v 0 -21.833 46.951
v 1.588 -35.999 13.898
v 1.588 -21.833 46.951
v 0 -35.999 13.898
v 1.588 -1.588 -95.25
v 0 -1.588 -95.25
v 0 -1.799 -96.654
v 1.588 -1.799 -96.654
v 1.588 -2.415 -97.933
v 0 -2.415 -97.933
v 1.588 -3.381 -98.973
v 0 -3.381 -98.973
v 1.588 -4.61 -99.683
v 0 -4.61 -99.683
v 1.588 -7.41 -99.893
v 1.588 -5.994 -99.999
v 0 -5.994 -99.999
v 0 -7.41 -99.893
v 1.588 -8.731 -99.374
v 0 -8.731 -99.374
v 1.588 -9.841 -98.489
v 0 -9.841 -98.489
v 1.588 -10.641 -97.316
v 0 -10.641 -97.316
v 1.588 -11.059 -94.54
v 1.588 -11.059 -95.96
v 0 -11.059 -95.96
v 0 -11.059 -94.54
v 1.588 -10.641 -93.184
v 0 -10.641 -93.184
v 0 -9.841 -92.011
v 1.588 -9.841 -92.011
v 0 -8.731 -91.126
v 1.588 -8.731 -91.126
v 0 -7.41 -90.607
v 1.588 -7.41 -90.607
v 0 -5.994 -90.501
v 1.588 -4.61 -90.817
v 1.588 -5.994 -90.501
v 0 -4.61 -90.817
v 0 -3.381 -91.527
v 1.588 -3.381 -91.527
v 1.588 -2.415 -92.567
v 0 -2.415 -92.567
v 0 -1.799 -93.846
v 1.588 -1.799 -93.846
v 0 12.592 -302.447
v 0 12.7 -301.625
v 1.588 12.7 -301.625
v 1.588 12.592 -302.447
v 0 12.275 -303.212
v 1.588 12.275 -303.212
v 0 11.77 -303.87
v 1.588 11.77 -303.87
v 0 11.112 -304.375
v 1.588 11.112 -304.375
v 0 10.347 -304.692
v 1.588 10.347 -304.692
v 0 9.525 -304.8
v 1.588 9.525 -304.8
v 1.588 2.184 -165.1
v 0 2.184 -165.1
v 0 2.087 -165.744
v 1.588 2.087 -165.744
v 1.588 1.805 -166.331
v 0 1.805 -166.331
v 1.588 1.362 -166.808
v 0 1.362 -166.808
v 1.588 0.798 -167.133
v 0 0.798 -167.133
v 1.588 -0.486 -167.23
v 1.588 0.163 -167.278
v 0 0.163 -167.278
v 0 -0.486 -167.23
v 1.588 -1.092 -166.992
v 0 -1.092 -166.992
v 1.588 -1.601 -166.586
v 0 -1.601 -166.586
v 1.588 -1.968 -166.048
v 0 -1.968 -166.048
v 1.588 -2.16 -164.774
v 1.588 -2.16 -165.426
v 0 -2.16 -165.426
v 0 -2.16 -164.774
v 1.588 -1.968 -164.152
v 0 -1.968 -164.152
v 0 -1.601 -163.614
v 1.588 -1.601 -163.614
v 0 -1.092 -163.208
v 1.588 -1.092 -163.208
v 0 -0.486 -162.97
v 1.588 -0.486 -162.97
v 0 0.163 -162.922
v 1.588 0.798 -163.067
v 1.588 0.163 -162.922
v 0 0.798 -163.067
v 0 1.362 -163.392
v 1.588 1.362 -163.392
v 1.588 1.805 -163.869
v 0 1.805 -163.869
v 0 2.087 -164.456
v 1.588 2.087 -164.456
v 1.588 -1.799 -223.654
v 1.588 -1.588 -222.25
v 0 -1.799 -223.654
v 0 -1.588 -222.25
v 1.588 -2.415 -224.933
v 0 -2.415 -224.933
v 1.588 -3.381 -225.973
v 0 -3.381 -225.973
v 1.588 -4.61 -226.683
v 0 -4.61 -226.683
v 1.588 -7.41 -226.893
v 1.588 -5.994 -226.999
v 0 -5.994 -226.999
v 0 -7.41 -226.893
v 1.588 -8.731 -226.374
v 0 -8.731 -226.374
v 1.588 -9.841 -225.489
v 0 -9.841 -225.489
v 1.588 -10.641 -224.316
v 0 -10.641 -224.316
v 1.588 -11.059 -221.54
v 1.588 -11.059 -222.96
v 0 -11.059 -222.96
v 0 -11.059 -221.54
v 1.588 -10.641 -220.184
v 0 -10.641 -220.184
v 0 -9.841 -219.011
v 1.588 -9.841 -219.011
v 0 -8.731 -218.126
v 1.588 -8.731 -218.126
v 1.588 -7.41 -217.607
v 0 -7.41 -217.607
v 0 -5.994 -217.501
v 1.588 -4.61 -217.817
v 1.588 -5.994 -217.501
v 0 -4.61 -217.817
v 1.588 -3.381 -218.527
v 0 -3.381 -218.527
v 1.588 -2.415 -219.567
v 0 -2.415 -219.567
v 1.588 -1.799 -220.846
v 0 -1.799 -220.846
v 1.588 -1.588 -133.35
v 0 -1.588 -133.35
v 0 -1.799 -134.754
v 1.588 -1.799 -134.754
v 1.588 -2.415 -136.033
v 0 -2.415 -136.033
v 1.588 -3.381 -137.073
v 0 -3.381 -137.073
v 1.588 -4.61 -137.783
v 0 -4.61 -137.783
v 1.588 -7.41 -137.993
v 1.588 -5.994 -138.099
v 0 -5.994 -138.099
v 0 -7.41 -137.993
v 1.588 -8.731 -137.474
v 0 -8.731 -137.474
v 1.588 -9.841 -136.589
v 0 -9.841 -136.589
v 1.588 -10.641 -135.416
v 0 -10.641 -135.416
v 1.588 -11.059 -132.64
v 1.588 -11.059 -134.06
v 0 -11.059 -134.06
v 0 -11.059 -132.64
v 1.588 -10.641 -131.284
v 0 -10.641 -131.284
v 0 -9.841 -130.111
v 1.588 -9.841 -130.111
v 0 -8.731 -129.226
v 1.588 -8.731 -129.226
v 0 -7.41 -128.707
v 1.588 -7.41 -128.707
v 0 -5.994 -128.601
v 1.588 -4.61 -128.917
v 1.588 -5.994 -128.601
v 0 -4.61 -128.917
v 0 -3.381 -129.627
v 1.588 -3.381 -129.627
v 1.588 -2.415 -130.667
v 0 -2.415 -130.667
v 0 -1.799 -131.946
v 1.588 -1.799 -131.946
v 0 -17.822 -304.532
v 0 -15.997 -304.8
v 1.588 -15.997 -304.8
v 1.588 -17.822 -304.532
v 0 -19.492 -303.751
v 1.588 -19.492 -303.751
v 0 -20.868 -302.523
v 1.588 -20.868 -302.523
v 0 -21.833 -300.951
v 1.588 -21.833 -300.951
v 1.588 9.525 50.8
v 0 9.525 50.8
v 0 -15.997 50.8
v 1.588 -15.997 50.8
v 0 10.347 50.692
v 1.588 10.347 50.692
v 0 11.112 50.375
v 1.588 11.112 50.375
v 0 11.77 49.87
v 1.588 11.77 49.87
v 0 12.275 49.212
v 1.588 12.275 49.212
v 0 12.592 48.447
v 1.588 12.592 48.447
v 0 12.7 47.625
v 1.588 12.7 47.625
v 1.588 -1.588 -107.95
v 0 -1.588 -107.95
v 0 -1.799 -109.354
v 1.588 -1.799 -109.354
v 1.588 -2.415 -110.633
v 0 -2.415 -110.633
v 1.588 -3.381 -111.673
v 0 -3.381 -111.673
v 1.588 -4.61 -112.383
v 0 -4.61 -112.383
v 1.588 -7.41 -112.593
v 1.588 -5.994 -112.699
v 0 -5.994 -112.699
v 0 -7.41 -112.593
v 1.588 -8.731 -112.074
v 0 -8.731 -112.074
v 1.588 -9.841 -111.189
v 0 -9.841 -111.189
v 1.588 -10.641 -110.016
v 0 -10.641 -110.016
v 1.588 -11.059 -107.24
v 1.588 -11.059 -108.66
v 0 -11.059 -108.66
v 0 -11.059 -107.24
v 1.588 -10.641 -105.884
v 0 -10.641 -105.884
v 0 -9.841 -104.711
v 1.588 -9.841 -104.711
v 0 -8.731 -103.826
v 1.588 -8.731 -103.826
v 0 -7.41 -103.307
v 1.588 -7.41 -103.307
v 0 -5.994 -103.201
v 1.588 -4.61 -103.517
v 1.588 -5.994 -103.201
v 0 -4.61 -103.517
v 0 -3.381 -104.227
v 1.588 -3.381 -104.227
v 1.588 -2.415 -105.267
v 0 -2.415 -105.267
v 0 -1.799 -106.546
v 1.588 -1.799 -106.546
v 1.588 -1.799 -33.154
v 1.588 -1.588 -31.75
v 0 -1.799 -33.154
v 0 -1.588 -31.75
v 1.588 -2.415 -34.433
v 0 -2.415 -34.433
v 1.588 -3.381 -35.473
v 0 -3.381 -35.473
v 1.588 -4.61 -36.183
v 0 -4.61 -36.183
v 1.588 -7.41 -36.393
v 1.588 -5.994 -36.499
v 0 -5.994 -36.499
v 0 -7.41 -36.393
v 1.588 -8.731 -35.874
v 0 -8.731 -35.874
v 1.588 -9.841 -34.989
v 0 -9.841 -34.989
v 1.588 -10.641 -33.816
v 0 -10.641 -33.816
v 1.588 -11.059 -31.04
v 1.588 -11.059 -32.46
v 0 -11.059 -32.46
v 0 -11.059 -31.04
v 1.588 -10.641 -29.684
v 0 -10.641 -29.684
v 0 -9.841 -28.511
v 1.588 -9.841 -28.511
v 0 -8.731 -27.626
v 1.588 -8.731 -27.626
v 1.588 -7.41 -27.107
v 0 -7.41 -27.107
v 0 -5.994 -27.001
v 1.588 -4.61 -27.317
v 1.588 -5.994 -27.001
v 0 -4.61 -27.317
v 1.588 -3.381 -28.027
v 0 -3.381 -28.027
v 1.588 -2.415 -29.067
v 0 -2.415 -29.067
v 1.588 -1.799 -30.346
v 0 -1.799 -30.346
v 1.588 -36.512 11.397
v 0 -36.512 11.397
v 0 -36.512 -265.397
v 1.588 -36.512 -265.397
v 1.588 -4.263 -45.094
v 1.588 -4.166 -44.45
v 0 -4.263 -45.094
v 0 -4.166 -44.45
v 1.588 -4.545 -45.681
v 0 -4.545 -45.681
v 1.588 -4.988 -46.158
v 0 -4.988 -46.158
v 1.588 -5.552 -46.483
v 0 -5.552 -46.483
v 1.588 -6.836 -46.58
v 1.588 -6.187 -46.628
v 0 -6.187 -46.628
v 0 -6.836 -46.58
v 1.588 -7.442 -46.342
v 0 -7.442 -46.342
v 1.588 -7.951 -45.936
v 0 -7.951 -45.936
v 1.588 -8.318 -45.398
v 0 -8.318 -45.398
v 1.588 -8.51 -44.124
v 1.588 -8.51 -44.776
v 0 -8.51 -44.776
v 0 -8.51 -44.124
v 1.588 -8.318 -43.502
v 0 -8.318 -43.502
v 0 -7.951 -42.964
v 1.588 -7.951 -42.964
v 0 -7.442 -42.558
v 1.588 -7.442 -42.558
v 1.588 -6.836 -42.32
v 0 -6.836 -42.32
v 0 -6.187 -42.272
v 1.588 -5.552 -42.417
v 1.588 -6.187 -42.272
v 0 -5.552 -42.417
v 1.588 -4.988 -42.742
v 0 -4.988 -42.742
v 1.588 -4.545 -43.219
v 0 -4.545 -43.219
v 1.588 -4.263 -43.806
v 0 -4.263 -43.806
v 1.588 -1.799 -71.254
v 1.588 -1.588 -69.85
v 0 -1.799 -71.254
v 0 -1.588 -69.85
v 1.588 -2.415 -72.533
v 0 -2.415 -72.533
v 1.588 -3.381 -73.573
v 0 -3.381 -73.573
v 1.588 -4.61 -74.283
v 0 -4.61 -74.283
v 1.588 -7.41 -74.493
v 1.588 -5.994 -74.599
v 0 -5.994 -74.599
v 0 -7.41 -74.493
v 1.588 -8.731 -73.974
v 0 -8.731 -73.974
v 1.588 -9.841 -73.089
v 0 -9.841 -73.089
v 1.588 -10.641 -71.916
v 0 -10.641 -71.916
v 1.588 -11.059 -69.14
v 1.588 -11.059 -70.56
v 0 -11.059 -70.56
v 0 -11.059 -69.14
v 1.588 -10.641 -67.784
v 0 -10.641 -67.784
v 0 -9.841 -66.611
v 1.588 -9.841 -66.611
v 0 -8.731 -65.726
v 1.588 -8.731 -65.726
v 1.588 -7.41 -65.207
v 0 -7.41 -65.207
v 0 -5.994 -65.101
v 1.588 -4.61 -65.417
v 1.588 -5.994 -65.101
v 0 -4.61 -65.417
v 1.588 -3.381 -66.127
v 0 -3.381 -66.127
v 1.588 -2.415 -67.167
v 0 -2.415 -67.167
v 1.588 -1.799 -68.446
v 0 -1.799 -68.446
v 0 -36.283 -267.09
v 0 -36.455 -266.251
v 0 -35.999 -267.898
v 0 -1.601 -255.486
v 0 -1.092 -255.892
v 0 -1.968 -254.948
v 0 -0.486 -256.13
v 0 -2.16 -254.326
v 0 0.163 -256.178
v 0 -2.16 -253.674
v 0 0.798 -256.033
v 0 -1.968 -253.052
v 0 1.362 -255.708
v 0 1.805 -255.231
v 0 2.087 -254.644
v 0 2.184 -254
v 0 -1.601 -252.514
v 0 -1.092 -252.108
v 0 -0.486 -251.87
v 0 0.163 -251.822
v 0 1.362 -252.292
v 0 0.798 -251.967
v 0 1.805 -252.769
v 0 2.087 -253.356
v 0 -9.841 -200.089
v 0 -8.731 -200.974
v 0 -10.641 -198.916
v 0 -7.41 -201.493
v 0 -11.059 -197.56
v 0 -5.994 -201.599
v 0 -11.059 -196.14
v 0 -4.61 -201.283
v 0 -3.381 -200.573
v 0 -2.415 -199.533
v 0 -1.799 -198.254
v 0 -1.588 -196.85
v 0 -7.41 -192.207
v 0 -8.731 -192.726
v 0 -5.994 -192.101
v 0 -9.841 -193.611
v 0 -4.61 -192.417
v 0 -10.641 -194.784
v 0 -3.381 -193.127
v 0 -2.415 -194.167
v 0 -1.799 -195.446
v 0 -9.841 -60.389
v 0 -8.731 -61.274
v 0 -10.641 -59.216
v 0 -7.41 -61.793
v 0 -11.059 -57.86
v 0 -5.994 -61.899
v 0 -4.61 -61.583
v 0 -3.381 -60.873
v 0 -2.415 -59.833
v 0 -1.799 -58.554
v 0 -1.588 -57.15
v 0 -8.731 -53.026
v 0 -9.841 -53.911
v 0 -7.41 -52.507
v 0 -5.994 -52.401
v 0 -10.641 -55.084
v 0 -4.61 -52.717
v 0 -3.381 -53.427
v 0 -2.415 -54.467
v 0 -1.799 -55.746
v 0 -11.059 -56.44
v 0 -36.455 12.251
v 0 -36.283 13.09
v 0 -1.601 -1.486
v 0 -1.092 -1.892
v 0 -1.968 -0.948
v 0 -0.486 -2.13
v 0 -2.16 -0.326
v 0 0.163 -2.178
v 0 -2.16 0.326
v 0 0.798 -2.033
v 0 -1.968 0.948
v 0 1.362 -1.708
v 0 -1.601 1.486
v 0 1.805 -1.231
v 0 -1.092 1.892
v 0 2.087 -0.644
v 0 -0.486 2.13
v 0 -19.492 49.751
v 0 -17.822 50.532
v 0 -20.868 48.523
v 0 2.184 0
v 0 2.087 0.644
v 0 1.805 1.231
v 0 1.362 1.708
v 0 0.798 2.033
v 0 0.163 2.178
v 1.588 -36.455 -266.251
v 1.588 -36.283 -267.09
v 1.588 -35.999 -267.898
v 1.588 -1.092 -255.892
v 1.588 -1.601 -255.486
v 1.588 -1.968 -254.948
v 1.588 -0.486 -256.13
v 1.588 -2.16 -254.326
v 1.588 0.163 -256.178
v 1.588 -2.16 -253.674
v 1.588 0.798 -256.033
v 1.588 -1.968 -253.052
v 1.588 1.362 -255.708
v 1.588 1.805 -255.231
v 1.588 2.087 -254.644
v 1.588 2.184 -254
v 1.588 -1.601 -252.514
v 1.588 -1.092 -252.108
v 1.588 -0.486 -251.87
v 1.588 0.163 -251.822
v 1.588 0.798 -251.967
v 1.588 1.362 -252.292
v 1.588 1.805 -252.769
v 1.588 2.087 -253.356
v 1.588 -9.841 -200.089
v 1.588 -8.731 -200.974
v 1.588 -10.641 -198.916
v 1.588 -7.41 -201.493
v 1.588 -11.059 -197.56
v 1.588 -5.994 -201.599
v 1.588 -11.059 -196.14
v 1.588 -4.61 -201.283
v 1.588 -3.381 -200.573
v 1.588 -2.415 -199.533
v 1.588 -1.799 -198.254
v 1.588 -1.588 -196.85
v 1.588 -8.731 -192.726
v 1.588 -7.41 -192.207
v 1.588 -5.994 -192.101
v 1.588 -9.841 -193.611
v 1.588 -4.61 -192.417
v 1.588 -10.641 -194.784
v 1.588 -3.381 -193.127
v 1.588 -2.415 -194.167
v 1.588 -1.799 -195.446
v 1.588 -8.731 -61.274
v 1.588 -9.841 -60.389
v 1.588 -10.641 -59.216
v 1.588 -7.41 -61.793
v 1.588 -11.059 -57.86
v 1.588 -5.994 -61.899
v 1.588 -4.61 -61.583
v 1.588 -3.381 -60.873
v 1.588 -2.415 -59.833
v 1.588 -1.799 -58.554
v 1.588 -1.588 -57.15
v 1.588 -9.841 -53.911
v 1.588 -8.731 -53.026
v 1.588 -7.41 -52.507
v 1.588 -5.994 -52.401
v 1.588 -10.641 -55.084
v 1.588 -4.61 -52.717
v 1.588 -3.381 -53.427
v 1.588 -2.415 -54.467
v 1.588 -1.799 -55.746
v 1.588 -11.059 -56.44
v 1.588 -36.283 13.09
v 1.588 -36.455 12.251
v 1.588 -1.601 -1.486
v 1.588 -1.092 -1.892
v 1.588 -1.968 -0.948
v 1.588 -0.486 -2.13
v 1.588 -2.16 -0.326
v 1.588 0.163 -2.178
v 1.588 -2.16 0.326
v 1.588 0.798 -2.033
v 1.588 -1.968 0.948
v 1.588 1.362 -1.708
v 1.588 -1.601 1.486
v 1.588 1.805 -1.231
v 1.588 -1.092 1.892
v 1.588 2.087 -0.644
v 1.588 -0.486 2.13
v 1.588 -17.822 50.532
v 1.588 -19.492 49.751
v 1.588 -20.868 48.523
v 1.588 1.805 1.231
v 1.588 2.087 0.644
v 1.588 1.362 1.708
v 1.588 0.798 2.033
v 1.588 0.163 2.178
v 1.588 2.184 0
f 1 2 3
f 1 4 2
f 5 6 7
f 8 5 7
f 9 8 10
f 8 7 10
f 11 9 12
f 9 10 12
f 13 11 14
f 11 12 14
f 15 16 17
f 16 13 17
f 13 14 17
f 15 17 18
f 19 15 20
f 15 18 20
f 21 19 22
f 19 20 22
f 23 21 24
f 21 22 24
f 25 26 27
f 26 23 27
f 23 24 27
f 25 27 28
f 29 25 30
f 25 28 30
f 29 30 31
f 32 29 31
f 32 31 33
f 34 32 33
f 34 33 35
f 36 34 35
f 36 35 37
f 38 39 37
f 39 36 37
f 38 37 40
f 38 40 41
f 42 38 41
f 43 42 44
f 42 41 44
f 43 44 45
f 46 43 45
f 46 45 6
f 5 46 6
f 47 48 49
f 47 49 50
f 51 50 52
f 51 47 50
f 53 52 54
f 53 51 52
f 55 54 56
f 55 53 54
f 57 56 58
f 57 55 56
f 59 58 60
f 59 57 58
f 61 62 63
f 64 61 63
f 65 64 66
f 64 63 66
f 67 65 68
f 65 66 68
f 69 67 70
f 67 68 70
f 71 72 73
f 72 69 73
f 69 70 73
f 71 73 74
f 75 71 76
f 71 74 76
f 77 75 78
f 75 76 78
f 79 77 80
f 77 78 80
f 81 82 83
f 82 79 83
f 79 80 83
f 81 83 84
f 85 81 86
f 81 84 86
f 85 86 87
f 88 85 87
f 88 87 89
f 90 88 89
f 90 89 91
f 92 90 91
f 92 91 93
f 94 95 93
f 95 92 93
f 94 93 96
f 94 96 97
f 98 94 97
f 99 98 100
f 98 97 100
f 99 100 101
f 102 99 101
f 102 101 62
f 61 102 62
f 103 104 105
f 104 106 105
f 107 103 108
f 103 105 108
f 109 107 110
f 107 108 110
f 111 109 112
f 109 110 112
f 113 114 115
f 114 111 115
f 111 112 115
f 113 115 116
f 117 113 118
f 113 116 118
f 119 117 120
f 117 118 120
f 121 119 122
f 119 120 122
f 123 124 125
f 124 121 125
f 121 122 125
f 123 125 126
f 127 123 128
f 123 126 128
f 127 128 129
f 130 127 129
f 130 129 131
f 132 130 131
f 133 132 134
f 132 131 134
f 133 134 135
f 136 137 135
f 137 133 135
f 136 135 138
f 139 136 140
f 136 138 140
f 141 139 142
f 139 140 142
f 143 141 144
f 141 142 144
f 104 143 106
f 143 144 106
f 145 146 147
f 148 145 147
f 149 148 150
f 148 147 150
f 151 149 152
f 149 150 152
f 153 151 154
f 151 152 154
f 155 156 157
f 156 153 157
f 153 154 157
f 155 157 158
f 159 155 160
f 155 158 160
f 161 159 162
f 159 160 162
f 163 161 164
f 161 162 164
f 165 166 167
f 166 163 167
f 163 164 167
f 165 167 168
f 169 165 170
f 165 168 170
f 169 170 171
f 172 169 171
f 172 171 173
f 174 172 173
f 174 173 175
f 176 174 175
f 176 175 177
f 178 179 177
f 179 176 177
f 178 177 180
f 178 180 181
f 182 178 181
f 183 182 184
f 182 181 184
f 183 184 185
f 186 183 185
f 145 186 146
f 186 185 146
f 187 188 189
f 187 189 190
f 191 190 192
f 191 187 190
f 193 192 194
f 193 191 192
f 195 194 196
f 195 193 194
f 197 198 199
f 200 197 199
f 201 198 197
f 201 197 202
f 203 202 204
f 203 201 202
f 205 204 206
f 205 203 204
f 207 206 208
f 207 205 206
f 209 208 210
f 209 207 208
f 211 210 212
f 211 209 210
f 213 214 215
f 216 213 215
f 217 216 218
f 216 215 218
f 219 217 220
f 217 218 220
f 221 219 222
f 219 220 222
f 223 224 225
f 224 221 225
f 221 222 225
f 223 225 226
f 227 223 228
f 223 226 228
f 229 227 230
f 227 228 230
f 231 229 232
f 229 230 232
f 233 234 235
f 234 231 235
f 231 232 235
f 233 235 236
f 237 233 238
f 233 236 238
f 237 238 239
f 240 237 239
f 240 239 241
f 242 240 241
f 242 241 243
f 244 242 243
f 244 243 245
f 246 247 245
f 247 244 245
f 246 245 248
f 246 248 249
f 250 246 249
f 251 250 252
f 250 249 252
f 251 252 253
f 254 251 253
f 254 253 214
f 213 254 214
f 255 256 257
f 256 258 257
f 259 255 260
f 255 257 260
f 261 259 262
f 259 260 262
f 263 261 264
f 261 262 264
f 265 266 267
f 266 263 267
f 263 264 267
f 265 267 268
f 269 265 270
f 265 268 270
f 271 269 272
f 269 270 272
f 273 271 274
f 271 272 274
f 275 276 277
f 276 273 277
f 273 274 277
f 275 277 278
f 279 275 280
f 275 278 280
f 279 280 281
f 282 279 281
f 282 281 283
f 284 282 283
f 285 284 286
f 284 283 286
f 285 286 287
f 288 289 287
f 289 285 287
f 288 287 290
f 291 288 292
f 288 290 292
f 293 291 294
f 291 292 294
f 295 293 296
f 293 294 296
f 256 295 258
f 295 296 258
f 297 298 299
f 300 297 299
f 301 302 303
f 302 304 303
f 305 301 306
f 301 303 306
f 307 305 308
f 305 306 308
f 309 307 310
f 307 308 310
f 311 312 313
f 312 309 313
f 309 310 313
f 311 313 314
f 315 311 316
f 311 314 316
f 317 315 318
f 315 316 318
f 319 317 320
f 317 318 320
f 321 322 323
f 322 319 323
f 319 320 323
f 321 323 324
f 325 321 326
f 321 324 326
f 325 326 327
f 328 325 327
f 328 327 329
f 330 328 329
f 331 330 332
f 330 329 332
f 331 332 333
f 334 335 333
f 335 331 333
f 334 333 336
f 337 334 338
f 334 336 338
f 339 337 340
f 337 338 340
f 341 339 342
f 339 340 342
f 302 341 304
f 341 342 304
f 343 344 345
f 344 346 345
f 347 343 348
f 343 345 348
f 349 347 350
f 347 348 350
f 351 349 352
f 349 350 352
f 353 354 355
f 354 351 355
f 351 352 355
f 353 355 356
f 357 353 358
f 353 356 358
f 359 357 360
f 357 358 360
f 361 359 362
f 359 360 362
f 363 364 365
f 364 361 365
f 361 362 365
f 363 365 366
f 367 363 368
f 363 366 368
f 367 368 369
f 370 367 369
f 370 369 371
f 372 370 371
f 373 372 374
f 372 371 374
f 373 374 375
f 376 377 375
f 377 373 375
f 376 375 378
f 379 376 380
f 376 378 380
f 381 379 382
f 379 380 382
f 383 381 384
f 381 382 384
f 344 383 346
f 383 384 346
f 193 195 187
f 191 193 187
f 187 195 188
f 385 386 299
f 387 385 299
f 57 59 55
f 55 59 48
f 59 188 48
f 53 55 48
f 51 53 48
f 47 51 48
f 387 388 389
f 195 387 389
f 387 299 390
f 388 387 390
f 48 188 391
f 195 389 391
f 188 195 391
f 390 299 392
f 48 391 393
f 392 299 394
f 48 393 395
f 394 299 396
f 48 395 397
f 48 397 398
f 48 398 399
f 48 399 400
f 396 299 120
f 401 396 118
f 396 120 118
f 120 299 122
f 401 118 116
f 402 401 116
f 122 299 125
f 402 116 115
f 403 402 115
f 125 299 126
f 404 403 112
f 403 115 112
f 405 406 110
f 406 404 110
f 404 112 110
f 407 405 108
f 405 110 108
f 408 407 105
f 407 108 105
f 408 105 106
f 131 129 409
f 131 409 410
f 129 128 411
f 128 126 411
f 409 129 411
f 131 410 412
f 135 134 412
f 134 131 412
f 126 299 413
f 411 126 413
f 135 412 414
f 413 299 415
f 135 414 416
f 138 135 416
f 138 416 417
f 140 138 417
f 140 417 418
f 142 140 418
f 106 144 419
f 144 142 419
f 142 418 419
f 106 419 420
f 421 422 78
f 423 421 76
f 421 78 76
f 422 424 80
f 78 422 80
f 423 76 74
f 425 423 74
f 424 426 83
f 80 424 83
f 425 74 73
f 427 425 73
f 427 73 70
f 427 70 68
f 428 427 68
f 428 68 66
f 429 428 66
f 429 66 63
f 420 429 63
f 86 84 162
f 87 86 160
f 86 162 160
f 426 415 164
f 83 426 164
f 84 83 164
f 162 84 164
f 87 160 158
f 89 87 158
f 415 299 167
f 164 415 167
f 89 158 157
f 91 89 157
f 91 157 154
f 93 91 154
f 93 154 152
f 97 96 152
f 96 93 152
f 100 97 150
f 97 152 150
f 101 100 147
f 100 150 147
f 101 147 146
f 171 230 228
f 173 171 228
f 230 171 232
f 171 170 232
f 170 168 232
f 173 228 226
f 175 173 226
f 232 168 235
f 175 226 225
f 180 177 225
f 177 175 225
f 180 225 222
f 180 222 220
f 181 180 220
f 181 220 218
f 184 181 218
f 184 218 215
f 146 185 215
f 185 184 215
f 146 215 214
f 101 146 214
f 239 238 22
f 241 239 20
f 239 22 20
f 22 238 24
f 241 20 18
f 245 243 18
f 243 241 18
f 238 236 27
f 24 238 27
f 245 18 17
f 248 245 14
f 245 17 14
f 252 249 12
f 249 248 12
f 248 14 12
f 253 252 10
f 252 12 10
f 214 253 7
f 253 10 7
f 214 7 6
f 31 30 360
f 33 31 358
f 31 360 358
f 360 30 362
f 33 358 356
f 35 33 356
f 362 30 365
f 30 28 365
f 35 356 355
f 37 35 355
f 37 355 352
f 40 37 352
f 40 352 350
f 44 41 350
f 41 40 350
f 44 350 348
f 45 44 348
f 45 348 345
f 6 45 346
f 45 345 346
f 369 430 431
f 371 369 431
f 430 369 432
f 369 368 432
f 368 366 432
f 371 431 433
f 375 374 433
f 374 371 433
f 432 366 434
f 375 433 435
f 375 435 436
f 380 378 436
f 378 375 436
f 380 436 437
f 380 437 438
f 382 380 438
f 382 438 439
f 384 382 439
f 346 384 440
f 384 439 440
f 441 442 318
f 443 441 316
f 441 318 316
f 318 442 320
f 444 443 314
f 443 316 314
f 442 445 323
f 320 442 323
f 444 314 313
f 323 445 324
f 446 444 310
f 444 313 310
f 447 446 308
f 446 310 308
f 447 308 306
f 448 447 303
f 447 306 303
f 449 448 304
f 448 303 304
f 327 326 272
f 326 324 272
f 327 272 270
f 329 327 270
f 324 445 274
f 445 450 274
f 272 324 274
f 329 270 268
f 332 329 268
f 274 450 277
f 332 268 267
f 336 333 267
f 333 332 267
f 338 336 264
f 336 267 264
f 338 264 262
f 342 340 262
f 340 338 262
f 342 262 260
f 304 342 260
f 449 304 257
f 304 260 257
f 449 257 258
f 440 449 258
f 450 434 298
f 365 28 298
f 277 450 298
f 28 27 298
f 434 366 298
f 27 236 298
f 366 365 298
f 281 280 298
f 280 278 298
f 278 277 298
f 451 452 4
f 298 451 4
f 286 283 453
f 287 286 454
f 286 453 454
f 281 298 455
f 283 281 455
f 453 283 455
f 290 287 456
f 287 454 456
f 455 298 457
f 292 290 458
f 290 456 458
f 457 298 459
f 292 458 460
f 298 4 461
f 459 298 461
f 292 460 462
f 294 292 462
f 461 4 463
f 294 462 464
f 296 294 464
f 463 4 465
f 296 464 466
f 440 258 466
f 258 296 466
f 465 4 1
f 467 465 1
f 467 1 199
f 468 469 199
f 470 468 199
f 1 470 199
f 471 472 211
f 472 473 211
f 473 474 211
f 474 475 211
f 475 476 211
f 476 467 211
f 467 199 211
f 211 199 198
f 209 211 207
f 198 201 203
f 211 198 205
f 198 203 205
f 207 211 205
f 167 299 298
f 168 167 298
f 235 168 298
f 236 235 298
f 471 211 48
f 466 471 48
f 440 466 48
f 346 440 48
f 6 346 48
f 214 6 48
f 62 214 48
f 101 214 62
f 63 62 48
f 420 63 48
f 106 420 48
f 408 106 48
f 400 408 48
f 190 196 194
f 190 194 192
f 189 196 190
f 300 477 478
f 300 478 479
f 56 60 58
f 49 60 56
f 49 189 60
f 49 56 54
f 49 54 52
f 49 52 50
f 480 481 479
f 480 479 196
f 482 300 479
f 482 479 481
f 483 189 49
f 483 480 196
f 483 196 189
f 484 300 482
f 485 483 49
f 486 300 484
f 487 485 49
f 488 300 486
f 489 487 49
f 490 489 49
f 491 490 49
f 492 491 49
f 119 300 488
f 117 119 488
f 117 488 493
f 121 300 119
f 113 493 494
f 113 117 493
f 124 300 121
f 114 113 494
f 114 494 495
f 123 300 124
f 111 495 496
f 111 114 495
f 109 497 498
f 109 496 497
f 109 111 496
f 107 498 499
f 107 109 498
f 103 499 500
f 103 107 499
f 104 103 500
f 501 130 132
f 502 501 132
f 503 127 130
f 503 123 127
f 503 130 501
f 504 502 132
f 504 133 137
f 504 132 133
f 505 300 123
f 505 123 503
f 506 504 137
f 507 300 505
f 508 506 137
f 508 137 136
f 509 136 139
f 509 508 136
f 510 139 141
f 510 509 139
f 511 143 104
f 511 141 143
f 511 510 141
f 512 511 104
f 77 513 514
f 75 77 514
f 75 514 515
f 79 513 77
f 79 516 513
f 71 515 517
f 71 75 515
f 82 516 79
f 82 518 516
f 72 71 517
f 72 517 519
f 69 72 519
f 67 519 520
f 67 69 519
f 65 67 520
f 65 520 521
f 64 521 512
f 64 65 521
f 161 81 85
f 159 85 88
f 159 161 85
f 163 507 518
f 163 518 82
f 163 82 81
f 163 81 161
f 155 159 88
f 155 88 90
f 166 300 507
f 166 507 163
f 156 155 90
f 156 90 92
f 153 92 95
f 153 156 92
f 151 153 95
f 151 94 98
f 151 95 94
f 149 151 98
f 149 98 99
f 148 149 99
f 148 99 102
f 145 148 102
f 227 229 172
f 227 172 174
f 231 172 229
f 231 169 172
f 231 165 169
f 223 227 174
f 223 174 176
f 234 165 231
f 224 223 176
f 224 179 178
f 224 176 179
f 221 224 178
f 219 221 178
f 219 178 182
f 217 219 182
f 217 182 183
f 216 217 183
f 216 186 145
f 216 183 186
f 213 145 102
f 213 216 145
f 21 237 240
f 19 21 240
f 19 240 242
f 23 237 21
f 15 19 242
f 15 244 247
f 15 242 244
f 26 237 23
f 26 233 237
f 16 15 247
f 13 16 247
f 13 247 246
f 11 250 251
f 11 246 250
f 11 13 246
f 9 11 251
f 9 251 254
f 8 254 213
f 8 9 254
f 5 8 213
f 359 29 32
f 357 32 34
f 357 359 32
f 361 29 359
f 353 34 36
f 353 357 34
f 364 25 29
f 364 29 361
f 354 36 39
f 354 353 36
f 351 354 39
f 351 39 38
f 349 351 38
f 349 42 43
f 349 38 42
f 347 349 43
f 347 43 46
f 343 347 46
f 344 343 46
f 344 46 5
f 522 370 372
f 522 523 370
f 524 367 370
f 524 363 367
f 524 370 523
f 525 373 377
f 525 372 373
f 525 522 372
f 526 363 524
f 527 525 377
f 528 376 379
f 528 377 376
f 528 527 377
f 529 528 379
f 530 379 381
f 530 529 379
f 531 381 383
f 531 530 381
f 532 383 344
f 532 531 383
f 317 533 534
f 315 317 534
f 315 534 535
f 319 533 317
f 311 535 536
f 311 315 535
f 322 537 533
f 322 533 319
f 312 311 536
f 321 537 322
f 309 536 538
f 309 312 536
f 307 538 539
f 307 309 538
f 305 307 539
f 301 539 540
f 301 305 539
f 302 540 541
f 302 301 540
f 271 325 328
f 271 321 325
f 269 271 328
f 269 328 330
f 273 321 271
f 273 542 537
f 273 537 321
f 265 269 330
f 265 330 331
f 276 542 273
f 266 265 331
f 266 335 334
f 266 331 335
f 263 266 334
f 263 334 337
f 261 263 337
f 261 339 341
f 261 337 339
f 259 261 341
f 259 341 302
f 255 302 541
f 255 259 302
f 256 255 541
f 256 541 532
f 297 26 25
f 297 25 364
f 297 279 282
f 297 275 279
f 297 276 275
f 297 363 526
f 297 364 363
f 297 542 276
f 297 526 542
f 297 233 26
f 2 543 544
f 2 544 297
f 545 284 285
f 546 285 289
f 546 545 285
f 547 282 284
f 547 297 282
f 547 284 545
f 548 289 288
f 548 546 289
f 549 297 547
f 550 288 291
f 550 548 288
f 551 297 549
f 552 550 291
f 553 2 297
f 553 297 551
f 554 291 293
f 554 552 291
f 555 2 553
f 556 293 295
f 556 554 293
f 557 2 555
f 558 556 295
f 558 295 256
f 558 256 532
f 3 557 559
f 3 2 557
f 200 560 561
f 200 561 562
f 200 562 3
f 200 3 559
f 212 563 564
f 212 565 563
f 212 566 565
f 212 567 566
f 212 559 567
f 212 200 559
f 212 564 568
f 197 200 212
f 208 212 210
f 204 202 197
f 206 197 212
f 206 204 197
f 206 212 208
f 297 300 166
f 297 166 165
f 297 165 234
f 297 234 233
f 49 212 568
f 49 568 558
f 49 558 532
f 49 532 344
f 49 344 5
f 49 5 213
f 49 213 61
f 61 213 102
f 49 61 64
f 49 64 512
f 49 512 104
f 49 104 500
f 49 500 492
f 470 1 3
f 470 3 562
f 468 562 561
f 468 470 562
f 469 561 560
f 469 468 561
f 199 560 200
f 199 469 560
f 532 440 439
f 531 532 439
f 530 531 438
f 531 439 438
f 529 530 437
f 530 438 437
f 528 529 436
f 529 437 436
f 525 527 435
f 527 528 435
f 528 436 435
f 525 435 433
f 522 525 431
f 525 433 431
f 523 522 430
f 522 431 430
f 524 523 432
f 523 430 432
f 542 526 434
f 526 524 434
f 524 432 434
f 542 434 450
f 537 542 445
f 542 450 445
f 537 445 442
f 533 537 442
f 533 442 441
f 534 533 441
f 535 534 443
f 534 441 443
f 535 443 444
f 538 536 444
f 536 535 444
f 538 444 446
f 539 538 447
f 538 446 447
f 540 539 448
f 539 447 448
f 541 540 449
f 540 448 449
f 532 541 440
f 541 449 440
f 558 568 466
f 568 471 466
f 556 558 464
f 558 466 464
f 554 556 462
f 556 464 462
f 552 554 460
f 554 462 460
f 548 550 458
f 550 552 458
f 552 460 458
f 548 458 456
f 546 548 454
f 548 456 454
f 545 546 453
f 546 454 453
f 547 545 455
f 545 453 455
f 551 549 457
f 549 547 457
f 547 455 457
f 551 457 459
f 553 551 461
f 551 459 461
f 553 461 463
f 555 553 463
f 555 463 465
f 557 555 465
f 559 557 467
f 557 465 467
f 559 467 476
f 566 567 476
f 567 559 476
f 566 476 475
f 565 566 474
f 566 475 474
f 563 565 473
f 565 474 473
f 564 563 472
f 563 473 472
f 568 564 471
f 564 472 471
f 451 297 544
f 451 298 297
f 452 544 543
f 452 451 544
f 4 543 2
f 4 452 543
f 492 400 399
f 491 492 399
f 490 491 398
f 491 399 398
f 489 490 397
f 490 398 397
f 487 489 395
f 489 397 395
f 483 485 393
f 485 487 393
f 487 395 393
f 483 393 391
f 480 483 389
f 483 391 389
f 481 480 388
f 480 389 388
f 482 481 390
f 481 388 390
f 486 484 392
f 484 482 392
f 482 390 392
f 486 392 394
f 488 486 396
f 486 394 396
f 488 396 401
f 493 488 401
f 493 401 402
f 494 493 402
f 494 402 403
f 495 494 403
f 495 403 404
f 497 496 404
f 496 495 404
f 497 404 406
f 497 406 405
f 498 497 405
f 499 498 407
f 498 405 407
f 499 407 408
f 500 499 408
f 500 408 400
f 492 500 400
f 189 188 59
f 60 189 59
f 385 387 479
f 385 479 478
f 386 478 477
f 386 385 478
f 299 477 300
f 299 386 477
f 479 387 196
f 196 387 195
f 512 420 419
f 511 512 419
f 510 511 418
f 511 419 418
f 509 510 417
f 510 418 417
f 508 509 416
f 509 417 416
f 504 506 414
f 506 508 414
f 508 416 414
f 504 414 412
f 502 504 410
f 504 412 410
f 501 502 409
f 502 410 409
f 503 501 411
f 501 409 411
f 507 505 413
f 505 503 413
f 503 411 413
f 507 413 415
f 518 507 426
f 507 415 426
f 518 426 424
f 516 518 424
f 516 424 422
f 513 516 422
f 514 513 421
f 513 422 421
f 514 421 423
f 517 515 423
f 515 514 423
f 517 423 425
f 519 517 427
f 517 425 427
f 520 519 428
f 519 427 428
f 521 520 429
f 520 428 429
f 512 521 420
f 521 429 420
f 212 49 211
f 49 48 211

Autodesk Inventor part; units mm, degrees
ref_plane "YZ Plane" through (0, 0, 0) normal (1, 0, 0) x (0, 1, 0)
ref_plane "XZ Plane" through (0, 0, 0) normal (0, 1, 0) x (-1, 0, 0)
ref_plane "XY Plane" through (0, 0, 0) normal (0, 0, 1) x (1, 0, 0)
sketch "skirt" plane through (0, 0, 0) normal (0, 0, 1) x (1, 0, 0)
  circle A0 centre (5.0031, 25.9038) radius 4.7625
  line L0 (24.0531, -167.7712) -> (24.0531, 181.4788)
  line L1 (-25.1594, 145.2504) -> (-25.1594, -131.5428)
  circle A1 centre (11.3531, 133.8538) radius 2.1844
  arc A2 (24.0531, 181.4788) -> (20.8781, 184.6538) centre (20.8781, 181.4788) ccw
  line L2 (20.8781, 184.6538) -> (-4.6437, 184.6538)
  line L3 (-24.646, 147.7518) -> (-10.4803, 180.8052)
  arc A3 (-4.6437, 184.6538) -> (-10.4803, 180.8052) centre (-4.6437, 178.3038) ccw
  arc A4 (-24.646, 147.7518) -> (-25.1594, 145.2504) centre (-18.8094, 145.2504) ccw
  line L4 (-24.646, -134.0442) -> (-10.4803, -167.0976)
  line L5 (-4.6437, -170.9462) -> (20.8781, -170.9462)
  arc A5 (20.8781, -170.9462) -> (24.0531, -167.7712) centre (20.8781, -167.7712) ccw
  arc A6 (-25.1594, -131.5428) -> (-24.646, -134.0442) centre (-18.8094, -131.5428) ccw
  circle A7 centre (11.3531, -120.1462) radius 2.1844
  arc A8 (-10.4803, -167.0976) -> (-4.6437, -170.9462) centre (-4.6437, -164.5962) ccw
  circle A9 centre (5.0031, 102.1038) radius 4.7625
  circle A10 centre (5.0031, 76.7038) radius 4.7625
  circle A11 centre (5.0031, 64.0038) radius 4.7625
  circle A12 centre (5.0031, 38.6038) radius 4.7625
  circle A13 centre (5.0031, 0.5038) radius 4.7625
  circle A14 centre (11.3531, -31.2462) radius 2.1844
  circle A15 centre (5.0031, -62.9962) radius 4.7625
  circle A16 centre (5.0031, -88.3962) radius 4.7625
  circle A17 centre (5.0031, 89.4038) radius 2.1844
  point P0 (-0.9322, -0.2017)
  point P1 (5.0031, 51.3038)
  point P2 (-25.1594, 146.5538)
  point P3 (-25.1594, -132.8462)
  point P4 (5.0031, -12.1962)
  point P5 (5.0031, 13.2038)
  dimension "d0" = 279.4
  dimension "d1" = 49.2125
  dimension "d2" = 3.175
  dimension "d3" = 113.199
  dimension "d4" = 113.199
  dimension "d5" = 6.35
  dimension "d7" = 9.525
  dimension "d13" = 50.8
  dimension "d14" = 50.8
  dimension "d15" = 9.525
  dimension "d16" = 4.3688
  dimension "d17" = 31.75
  dimension "d18" = 4.3688
sketch "Sketch1" plane through (0, 0, 0) normal (1, 0, 0) x (0, 1, 0)
  circle A0 centre (-6.35, -107.95) radius 4.7625
  line L0 (12.7, -301.625) -> (12.7, 47.625)
  line L1 (-36.5125, 11.3966) -> (-36.5125, -265.3966)
  circle A1 centre (0, 0) radius 2.1844
  arc A2 (12.7, 47.625) -> (9.525, 50.8) centre (9.525, 47.625) ccw
  line L2 (9.525, 50.8) -> (-15.9968, 50.8)
  line L3 (-35.9991, 13.898) -> (-21.8333, 46.9514)
  arc A3 (-15.9968, 50.8) -> (-21.8333, 46.9514) centre (-15.9968, 44.45) ccw
  arc A4 (-35.9991, 13.898) -> (-36.5125, 11.3966) centre (-30.1625, 11.3966) ccw
  line L4 (-35.9991, -267.898) -> (-21.8333, -300.9514)
  line L5 (-15.9968, -304.8) -> (9.525, -304.8)
  arc A5 (9.525, -304.8) -> (12.7, -301.625) centre (9.525, -301.625) ccw
  arc A6 (-36.5125, -265.3966) -> (-35.9991, -267.898) centre (-30.1625, -265.3966) ccw
  circle A7 centre (0, -254) radius 2.1844
  arc A8 (-21.8333, -300.9514) -> (-15.9968, -304.8) centre (-15.9968, -298.45) ccw
  circle A9 centre (-6.35, -31.75) radius 4.7625
  circle A10 centre (-6.35, -57.15) radius 4.7625
  circle A11 centre (-6.35, -69.85) radius 4.7625
  circle A12 centre (-6.35, -95.25) radius 4.7625
  circle A13 centre (-6.35, -133.35) radius 4.7625
  circle A14 centre (0, -165.1) radius 2.1844
  circle A15 centre (-6.35, -196.85) radius 4.7625
  circle A16 centre (-6.35, -222.25) radius 4.7625
  circle A17 centre (-6.35, -44.45) radius 2.1844
extrude "Extrusion1" add sketch "Sketch1" along normal blind 1.5875
properties part number "Skirt" material "Acetal Resin, White"
